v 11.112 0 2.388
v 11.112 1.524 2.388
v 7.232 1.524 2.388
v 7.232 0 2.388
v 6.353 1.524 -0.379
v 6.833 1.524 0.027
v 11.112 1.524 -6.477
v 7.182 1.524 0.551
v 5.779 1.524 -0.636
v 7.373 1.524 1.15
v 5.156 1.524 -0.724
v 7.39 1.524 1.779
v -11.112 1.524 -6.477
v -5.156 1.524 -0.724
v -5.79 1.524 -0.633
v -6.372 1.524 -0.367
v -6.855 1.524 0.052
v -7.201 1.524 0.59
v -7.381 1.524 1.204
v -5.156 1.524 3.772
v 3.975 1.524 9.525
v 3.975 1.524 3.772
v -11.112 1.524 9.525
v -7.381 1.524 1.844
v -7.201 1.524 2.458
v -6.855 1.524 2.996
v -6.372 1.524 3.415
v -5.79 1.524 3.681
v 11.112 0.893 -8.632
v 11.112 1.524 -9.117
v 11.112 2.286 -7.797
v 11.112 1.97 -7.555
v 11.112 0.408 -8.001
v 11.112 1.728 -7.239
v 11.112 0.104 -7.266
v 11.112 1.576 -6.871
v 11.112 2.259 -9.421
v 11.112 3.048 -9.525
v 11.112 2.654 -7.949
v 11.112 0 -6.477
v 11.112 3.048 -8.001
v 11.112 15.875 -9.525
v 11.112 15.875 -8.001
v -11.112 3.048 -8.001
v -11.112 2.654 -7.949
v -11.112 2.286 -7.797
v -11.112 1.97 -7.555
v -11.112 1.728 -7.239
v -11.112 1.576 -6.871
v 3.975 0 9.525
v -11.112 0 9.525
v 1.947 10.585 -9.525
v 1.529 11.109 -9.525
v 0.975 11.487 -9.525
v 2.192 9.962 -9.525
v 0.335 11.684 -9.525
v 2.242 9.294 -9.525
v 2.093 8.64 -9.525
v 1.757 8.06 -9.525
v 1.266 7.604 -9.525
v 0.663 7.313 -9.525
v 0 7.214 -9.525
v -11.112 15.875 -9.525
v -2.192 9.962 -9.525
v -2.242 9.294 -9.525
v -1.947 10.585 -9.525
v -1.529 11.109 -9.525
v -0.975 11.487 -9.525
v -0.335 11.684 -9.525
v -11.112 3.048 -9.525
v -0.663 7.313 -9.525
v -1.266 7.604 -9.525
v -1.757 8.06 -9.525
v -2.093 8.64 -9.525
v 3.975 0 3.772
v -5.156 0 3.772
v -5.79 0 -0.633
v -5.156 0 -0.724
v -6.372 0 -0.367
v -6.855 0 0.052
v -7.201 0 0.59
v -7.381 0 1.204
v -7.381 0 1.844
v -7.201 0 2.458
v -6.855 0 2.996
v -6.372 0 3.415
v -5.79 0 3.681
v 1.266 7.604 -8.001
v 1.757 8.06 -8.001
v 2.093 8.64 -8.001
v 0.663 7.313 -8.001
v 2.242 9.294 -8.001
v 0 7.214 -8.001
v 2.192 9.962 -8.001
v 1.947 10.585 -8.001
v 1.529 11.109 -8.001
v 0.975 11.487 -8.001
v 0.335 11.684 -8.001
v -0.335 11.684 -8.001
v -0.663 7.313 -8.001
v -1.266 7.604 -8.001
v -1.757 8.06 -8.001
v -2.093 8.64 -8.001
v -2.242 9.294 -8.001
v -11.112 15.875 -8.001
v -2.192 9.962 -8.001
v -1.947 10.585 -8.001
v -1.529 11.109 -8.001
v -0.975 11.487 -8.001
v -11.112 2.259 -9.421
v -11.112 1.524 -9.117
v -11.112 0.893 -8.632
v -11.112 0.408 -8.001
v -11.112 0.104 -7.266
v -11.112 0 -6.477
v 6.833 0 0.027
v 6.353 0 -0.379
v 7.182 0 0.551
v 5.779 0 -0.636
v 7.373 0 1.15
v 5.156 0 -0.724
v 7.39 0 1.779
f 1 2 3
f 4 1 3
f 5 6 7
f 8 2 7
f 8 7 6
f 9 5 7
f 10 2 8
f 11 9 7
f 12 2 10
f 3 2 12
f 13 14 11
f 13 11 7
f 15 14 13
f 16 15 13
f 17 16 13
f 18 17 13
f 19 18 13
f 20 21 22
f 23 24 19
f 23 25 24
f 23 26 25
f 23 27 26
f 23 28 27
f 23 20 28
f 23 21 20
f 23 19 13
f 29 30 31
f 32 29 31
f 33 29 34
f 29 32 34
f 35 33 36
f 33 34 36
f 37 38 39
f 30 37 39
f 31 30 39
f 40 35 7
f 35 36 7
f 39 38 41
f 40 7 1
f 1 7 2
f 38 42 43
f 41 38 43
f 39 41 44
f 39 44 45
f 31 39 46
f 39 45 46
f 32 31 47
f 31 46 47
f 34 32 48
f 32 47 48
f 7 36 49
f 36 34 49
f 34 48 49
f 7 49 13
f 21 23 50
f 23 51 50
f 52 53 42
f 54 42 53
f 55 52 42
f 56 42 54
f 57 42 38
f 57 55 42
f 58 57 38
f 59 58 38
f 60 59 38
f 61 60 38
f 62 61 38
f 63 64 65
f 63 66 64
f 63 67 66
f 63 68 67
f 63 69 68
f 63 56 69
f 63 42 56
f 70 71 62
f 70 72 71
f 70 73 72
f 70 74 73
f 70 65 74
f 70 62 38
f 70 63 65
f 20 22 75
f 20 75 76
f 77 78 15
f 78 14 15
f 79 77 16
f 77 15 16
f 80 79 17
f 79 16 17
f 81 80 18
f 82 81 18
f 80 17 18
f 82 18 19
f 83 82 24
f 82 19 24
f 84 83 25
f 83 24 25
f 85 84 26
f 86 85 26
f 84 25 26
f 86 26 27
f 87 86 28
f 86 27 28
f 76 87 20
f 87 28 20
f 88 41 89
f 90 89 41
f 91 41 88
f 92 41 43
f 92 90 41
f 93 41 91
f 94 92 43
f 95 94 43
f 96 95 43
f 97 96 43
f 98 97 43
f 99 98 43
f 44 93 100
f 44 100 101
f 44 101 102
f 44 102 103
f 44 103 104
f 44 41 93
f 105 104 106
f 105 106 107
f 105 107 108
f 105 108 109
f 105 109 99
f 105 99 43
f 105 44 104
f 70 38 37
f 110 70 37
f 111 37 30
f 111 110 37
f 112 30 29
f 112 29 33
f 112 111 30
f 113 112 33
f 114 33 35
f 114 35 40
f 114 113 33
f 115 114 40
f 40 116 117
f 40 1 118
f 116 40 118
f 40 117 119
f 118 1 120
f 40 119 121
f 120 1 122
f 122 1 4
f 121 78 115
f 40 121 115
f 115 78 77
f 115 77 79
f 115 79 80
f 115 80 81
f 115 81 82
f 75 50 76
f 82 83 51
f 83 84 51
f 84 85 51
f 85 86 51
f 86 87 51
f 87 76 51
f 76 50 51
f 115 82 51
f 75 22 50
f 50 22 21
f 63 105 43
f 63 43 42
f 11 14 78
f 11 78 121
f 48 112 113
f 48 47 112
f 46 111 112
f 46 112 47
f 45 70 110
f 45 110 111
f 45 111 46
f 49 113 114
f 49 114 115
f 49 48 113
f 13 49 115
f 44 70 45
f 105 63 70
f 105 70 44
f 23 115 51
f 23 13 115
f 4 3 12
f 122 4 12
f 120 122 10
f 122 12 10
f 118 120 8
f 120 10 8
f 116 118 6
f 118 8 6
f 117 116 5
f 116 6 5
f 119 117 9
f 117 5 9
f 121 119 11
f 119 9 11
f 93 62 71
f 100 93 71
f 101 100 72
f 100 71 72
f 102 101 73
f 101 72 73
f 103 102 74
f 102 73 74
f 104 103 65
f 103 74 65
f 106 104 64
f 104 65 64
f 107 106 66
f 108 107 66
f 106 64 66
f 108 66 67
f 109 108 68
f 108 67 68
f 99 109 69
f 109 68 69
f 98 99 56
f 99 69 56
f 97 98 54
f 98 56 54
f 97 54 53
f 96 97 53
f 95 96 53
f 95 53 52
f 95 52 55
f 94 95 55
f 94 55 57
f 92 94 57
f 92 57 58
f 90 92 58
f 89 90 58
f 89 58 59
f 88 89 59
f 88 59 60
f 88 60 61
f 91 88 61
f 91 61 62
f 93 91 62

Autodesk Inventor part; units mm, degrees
ref_plane "YZ Plane" through (0, 0, 0) normal (1, 0, 0) x (0, 1, 0)
ref_plane "XZ Plane" through (0, 0, 0) normal (0, 1, 0) x (-1, 0, 0)
ref_plane "XY Plane" through (0, 0, 0) normal (0, 0, 1) x (1, 0, 0)
sketch "Sketch1" plane through (0, 0, 0) normal (0, 1, 0) x (-1, 0, 0)
  line L0 (11.1125, 9.525) -> (-11.1125, 9.525)
  line L1 (-11.1125, 9.525) -> (-11.1125, -9.525)
  line L2 (-11.1125, -9.525) -> (11.1125, -9.525)
  line L3 (11.1125, -9.525) -> (11.1125, 9.525)
  line L4 (11.1125, 9.525) -> (-11.1125, -9.525) construction
  line L5 (-11.1125, 9.525) -> (11.1125, -9.525) construction
  point P0 (0, 0)
  dimension "d0" = 22.225
  dimension "d1" = 19.05
extrude "Plate1" add sketch "Sketch1" along normal blind 1.524
sketch "Sketch2" plane through (-11.1125, 0, -8.001) normal (0, 0, -1) x (-1, 0, 0)
  line L0 (-22.225, 0) -> (0, 0)
  line L1 (0, 0) -> (0, 15.875)
  line L2 (0, 15.875) -> (-22.225, 15.875)
  line L3 (-22.225, 15.875) -> (-22.225, 0)
edge flange "Flange1" height 15.875 angle 90 thickness 1.524 bend radius 1.524 thickness toward (0, 0, -1) relief tear relief width 1.524 relief depth 0.762 edges at (0, 1.524, -9.525) wall of the first edge with corners at (11.1125, 0, -8.001) (-11.1125, 0, -8.001) (-11.1125, 15.875, -8.001) (11.1125, 15.875, -8.001)
bend "Bend1"
corner "Corner1"
sketch "Sketch3" plane through (0, 1.524, 0) normal (0, 1, 0) x (1, 0, 0)
  line L0 (11.1125, 6.477) -> (-11.1125, 6.477) projected
  line L1 (-11.1125, -9.525) -> (-11.1125, 6.477) projected
  line L2 (11.1125, -9.525) -> (-11.1125, -9.525) projected
  line L3 (11.1125, 6.477) -> (11.1125, -9.525) projected
  line L4 (-11.1125, -1.524) -> (11.1125, -1.524) construction
  line L5 (0, 6.477) -> (0, -9.525) construction
  circle A0 centre (0, -1.524) radius 2.2479
  line L6 (-5.1562, -1.524) -> (5.1562, -1.524) construction
  line L7 (-5.1562, 0.7239) -> (5.1562, 0.7239)
  line L8 (5.1562, -3.7719) -> (-5.1562, -3.7719)
  arc A1 (-5.1562, 0.7239) -> (-5.1562, -3.7719) centre (-5.1562, -1.524) ccw
  arc A2 (5.1562, -3.7719) -> (5.1562, 0.7239) centre (5.1562, -1.524) ccw
  point P0 (0, 0)
  dimension "d13" = 16.002
  dimension "d14" = 22.225
  dimension "d24" = 4.4958
  dimension "d25" = 3.7084
sketch "Sketch4" plane through (-11.1125, 15.875, -8.001) normal (0, 0, 1) x (1, 0, 0)
  line L0 (0, -12.827) -> (22.225, -12.827) projected
  line L1 (22.225, 0) -> (22.225, -12.827) projected
  line L2 (22.225, 0) -> (0, 0) projected
  line L3 (0, 0) -> (0, -12.827) projected
  line L4 (0, -6.4135) -> (22.225, -6.4135) construction
  line L5 (22.225, 0) -> (22.225, -12.827) construction
  line L6 (11.1125, -12.827) -> (11.1125, 0) construction
  line L7 (22.225, 0) -> (0, 0) construction
  point P0 (11.1125, -15.875)
  point P1 (11.1125, -6.4135)
  dimension "d15" = 22.225
  dimension "d16" = 12.827
hole "Hole1" at (0, 9.4615, -8.001) direction (0, 0, -1) diameter 4.4958 depth 1.524 tip angle 118 clearance for "Flat Head Machine Screw (82)" size "#8" standard "Ansi Unified Screw Threads"
extrude "Cut1" cut sketch "Sketch3" against normal blind 1.524 contours A0 | A0 L7 A2 L8 | A0 L8 A1 L7
sketch "Sketch7" plane through (11.1125, 15.875, -9.525) normal (0, 0, -1) x (-1, 0, 0)
  line L0 (0, 0) -> (22.225, 0) projected
  line L1 (22.225, -15.875) -> (0, -15.875) projected
  line L2 (0, -12.827) -> (22.225, -12.827) projected
  point P0 (11.1125, -15.875)
  dimension "d28" = 15.875
  dimension "d29" = 12.827
  dimension "d30" = 22.225
sketch "Sketch8" plane through (0, 0, 0) normal (0, -1, 0) x (1, 0, 0)
  arc A0 (-5.1562, 3.7719) -> (-5.1562, -0.7239) centre (-5.1562, 1.524) ccw projected
  line L0 (-5.1562, 3.7719) -> (5.1562, 3.7719) projected
  arc A1 (5.1562, -0.7239) -> (5.1562, 3.7719) centre (5.1562, 1.524) ccw projected
  line L1 (5.1562, -0.7239) -> (-5.1562, -0.7239) projected
  line L2 (-11.1125, -6.477) -> (11.1125, -6.477) projected
  line L3 (11.1125, 9.525) -> (11.1125, -6.477) projected
  line L4 (-11.1125, 9.525) -> (11.1125, 9.525) projected
  line L5 (-11.1125, -6.477) -> (-11.1125, 9.525) projected
  line L6 (11.1125, -9.525) -> (-11.1125, -9.525) projected
  line L7 (11.1125, -6.477) -> (11.1125, -9.525) projected
  line L8 (-11.1125, -6.477) -> (11.1125, -6.477) projected
  line L9 (-11.1125, -9.525) -> (-11.1125, -6.477) projected
  point P0 (0, 0)
  dimension "d31" = 19.05
  dimension "d32" = 16.002
sketch "Sketch9" plane through (0, 1.524, 0) normal (0, 1, 0) x (1, 0, 0)
  arc A0 (5.1562, -3.7719) -> (5.1562, 0.7239) centre (5.1562, -1.524) ccw projected
  arc A1 (-5.1562, 0.7239) -> (-5.1562, -3.7719) centre (-5.1562, -1.524) ccw projected
  line L0 (5.1562, -3.7719) -> (-5.1562, -3.7719) projected
  line L1 (-5.1562, 0.7239) -> (5.1562, 0.7239) projected
  circle A2 centre (0, -1.524) radius 2.2479
  point P0 (0, 0)
  dimension "d34" = 5.1562
sketch "Sketch10" plane through (-11.1125, 15.875, -9.525) normal (0, 1, 0) x (1, 0, 0)
  line L0 (22.225, -19.05) -> (0, -19.05) projected
  line L1 (22.225, 0) -> (0, 0) projected
  line L2 (0, -1.524) -> (0, 0) projected
  line L3 (0, -1.524) -> (0, -3.048) projected
  line L4 (0, -19.05) -> (0, -3.048) projected
  line L5 (0, 0) -> (7.1374, 0)
  line L6 (7.1374, 0) -> (7.1374, -19.05)
  line L7 (7.1374, -19.05) -> (0, -19.05)
  line L8 (0, -19.05) -> (0, 0)
  line L9 (22.225, 0) -> (15.0876, 0)
  line L10 (15.0876, 0) -> (15.0876, -19.05)
  line L11 (15.0876, -19.05) -> (22.225, -19.05)
  line L12 (22.225, -19.05) -> (22.225, 0)
  line L13 (22.225, -3.048) -> (22.225, -19.05) projected
  line L14 (0, -19.05) -> (22.225, -19.05)
  line L15 (22.225, -19.05) -> (22.225, -11.9126)
  line L16 (22.225, -11.9126) -> (0, -11.9126)
  line L17 (0, -11.9126) -> (0, -19.05)
  line L18 (0, -19.05) -> (7.1374, -19.05)
  line L19 (7.1374, -19.05) -> (7.1374, -11.9126)
  line L20 (7.1374, -11.9126) -> (0, -11.9126)
  line L21 (0, -11.9126) -> (0, -19.05)
  line L22 (22.225, -19.05) -> (15.0876, -19.05)
  line L23 (15.0876, -19.05) -> (15.0876, -11.9126)
  line L24 (15.0876, -11.9126) -> (22.225, -11.9126)
  line L25 (22.225, -11.9126) -> (22.225, -19.05)
  point P0 (11.1125, -9.525)
  dimension "d35" = 7.1374
  dimension "d36" = 7.1374
  dimension "d37" = 7.1374
extrude "Cut2" cut sketch "Sketch10" against normal through all contours L0 L10 L16 L12
equation "\"d22\" = Thickness"
equation "\"d26\" = Thickness"
equation "\"d36\" = d35"
equation "\"d38\" = Thickness"
equation "\"d3\" = BendReliefWidth"
equation "\"d4\" = BendReliefDepth"
equation "\"d5\" = MinimumRemnant"
equation "\"d6\" = BendRadius"
equation "\"d9\" = BendRadius"
equation "\"d10\" = CornerReliefSize"
equation "\"d11\" = GapSize"
equation "\"d12\" = JacobiRadiusSize"
equation "\"BendRadius\" = Thickness"
equation "\"BendReliefWidth\" = Thickness"
equation "\"BendReliefDepth\" = 0.5 * Thickness"
equation "\"CornerReliefSize\" = 4 * Thickness"
equation "\"MinimumRemnant\" = 2 * Thickness"
equation "\"TransitionRadius\" = BendRadius"
equation "\"JacobiRadiusSize\" = BendRadius"
equation "\"GapSize\" = Thickness"
equation "\"d2\" = BendRadius"
equation "\"Thickness\" = 1.524"
properties part number "Bracket (15275A53)_RightCut" material "Steel"
